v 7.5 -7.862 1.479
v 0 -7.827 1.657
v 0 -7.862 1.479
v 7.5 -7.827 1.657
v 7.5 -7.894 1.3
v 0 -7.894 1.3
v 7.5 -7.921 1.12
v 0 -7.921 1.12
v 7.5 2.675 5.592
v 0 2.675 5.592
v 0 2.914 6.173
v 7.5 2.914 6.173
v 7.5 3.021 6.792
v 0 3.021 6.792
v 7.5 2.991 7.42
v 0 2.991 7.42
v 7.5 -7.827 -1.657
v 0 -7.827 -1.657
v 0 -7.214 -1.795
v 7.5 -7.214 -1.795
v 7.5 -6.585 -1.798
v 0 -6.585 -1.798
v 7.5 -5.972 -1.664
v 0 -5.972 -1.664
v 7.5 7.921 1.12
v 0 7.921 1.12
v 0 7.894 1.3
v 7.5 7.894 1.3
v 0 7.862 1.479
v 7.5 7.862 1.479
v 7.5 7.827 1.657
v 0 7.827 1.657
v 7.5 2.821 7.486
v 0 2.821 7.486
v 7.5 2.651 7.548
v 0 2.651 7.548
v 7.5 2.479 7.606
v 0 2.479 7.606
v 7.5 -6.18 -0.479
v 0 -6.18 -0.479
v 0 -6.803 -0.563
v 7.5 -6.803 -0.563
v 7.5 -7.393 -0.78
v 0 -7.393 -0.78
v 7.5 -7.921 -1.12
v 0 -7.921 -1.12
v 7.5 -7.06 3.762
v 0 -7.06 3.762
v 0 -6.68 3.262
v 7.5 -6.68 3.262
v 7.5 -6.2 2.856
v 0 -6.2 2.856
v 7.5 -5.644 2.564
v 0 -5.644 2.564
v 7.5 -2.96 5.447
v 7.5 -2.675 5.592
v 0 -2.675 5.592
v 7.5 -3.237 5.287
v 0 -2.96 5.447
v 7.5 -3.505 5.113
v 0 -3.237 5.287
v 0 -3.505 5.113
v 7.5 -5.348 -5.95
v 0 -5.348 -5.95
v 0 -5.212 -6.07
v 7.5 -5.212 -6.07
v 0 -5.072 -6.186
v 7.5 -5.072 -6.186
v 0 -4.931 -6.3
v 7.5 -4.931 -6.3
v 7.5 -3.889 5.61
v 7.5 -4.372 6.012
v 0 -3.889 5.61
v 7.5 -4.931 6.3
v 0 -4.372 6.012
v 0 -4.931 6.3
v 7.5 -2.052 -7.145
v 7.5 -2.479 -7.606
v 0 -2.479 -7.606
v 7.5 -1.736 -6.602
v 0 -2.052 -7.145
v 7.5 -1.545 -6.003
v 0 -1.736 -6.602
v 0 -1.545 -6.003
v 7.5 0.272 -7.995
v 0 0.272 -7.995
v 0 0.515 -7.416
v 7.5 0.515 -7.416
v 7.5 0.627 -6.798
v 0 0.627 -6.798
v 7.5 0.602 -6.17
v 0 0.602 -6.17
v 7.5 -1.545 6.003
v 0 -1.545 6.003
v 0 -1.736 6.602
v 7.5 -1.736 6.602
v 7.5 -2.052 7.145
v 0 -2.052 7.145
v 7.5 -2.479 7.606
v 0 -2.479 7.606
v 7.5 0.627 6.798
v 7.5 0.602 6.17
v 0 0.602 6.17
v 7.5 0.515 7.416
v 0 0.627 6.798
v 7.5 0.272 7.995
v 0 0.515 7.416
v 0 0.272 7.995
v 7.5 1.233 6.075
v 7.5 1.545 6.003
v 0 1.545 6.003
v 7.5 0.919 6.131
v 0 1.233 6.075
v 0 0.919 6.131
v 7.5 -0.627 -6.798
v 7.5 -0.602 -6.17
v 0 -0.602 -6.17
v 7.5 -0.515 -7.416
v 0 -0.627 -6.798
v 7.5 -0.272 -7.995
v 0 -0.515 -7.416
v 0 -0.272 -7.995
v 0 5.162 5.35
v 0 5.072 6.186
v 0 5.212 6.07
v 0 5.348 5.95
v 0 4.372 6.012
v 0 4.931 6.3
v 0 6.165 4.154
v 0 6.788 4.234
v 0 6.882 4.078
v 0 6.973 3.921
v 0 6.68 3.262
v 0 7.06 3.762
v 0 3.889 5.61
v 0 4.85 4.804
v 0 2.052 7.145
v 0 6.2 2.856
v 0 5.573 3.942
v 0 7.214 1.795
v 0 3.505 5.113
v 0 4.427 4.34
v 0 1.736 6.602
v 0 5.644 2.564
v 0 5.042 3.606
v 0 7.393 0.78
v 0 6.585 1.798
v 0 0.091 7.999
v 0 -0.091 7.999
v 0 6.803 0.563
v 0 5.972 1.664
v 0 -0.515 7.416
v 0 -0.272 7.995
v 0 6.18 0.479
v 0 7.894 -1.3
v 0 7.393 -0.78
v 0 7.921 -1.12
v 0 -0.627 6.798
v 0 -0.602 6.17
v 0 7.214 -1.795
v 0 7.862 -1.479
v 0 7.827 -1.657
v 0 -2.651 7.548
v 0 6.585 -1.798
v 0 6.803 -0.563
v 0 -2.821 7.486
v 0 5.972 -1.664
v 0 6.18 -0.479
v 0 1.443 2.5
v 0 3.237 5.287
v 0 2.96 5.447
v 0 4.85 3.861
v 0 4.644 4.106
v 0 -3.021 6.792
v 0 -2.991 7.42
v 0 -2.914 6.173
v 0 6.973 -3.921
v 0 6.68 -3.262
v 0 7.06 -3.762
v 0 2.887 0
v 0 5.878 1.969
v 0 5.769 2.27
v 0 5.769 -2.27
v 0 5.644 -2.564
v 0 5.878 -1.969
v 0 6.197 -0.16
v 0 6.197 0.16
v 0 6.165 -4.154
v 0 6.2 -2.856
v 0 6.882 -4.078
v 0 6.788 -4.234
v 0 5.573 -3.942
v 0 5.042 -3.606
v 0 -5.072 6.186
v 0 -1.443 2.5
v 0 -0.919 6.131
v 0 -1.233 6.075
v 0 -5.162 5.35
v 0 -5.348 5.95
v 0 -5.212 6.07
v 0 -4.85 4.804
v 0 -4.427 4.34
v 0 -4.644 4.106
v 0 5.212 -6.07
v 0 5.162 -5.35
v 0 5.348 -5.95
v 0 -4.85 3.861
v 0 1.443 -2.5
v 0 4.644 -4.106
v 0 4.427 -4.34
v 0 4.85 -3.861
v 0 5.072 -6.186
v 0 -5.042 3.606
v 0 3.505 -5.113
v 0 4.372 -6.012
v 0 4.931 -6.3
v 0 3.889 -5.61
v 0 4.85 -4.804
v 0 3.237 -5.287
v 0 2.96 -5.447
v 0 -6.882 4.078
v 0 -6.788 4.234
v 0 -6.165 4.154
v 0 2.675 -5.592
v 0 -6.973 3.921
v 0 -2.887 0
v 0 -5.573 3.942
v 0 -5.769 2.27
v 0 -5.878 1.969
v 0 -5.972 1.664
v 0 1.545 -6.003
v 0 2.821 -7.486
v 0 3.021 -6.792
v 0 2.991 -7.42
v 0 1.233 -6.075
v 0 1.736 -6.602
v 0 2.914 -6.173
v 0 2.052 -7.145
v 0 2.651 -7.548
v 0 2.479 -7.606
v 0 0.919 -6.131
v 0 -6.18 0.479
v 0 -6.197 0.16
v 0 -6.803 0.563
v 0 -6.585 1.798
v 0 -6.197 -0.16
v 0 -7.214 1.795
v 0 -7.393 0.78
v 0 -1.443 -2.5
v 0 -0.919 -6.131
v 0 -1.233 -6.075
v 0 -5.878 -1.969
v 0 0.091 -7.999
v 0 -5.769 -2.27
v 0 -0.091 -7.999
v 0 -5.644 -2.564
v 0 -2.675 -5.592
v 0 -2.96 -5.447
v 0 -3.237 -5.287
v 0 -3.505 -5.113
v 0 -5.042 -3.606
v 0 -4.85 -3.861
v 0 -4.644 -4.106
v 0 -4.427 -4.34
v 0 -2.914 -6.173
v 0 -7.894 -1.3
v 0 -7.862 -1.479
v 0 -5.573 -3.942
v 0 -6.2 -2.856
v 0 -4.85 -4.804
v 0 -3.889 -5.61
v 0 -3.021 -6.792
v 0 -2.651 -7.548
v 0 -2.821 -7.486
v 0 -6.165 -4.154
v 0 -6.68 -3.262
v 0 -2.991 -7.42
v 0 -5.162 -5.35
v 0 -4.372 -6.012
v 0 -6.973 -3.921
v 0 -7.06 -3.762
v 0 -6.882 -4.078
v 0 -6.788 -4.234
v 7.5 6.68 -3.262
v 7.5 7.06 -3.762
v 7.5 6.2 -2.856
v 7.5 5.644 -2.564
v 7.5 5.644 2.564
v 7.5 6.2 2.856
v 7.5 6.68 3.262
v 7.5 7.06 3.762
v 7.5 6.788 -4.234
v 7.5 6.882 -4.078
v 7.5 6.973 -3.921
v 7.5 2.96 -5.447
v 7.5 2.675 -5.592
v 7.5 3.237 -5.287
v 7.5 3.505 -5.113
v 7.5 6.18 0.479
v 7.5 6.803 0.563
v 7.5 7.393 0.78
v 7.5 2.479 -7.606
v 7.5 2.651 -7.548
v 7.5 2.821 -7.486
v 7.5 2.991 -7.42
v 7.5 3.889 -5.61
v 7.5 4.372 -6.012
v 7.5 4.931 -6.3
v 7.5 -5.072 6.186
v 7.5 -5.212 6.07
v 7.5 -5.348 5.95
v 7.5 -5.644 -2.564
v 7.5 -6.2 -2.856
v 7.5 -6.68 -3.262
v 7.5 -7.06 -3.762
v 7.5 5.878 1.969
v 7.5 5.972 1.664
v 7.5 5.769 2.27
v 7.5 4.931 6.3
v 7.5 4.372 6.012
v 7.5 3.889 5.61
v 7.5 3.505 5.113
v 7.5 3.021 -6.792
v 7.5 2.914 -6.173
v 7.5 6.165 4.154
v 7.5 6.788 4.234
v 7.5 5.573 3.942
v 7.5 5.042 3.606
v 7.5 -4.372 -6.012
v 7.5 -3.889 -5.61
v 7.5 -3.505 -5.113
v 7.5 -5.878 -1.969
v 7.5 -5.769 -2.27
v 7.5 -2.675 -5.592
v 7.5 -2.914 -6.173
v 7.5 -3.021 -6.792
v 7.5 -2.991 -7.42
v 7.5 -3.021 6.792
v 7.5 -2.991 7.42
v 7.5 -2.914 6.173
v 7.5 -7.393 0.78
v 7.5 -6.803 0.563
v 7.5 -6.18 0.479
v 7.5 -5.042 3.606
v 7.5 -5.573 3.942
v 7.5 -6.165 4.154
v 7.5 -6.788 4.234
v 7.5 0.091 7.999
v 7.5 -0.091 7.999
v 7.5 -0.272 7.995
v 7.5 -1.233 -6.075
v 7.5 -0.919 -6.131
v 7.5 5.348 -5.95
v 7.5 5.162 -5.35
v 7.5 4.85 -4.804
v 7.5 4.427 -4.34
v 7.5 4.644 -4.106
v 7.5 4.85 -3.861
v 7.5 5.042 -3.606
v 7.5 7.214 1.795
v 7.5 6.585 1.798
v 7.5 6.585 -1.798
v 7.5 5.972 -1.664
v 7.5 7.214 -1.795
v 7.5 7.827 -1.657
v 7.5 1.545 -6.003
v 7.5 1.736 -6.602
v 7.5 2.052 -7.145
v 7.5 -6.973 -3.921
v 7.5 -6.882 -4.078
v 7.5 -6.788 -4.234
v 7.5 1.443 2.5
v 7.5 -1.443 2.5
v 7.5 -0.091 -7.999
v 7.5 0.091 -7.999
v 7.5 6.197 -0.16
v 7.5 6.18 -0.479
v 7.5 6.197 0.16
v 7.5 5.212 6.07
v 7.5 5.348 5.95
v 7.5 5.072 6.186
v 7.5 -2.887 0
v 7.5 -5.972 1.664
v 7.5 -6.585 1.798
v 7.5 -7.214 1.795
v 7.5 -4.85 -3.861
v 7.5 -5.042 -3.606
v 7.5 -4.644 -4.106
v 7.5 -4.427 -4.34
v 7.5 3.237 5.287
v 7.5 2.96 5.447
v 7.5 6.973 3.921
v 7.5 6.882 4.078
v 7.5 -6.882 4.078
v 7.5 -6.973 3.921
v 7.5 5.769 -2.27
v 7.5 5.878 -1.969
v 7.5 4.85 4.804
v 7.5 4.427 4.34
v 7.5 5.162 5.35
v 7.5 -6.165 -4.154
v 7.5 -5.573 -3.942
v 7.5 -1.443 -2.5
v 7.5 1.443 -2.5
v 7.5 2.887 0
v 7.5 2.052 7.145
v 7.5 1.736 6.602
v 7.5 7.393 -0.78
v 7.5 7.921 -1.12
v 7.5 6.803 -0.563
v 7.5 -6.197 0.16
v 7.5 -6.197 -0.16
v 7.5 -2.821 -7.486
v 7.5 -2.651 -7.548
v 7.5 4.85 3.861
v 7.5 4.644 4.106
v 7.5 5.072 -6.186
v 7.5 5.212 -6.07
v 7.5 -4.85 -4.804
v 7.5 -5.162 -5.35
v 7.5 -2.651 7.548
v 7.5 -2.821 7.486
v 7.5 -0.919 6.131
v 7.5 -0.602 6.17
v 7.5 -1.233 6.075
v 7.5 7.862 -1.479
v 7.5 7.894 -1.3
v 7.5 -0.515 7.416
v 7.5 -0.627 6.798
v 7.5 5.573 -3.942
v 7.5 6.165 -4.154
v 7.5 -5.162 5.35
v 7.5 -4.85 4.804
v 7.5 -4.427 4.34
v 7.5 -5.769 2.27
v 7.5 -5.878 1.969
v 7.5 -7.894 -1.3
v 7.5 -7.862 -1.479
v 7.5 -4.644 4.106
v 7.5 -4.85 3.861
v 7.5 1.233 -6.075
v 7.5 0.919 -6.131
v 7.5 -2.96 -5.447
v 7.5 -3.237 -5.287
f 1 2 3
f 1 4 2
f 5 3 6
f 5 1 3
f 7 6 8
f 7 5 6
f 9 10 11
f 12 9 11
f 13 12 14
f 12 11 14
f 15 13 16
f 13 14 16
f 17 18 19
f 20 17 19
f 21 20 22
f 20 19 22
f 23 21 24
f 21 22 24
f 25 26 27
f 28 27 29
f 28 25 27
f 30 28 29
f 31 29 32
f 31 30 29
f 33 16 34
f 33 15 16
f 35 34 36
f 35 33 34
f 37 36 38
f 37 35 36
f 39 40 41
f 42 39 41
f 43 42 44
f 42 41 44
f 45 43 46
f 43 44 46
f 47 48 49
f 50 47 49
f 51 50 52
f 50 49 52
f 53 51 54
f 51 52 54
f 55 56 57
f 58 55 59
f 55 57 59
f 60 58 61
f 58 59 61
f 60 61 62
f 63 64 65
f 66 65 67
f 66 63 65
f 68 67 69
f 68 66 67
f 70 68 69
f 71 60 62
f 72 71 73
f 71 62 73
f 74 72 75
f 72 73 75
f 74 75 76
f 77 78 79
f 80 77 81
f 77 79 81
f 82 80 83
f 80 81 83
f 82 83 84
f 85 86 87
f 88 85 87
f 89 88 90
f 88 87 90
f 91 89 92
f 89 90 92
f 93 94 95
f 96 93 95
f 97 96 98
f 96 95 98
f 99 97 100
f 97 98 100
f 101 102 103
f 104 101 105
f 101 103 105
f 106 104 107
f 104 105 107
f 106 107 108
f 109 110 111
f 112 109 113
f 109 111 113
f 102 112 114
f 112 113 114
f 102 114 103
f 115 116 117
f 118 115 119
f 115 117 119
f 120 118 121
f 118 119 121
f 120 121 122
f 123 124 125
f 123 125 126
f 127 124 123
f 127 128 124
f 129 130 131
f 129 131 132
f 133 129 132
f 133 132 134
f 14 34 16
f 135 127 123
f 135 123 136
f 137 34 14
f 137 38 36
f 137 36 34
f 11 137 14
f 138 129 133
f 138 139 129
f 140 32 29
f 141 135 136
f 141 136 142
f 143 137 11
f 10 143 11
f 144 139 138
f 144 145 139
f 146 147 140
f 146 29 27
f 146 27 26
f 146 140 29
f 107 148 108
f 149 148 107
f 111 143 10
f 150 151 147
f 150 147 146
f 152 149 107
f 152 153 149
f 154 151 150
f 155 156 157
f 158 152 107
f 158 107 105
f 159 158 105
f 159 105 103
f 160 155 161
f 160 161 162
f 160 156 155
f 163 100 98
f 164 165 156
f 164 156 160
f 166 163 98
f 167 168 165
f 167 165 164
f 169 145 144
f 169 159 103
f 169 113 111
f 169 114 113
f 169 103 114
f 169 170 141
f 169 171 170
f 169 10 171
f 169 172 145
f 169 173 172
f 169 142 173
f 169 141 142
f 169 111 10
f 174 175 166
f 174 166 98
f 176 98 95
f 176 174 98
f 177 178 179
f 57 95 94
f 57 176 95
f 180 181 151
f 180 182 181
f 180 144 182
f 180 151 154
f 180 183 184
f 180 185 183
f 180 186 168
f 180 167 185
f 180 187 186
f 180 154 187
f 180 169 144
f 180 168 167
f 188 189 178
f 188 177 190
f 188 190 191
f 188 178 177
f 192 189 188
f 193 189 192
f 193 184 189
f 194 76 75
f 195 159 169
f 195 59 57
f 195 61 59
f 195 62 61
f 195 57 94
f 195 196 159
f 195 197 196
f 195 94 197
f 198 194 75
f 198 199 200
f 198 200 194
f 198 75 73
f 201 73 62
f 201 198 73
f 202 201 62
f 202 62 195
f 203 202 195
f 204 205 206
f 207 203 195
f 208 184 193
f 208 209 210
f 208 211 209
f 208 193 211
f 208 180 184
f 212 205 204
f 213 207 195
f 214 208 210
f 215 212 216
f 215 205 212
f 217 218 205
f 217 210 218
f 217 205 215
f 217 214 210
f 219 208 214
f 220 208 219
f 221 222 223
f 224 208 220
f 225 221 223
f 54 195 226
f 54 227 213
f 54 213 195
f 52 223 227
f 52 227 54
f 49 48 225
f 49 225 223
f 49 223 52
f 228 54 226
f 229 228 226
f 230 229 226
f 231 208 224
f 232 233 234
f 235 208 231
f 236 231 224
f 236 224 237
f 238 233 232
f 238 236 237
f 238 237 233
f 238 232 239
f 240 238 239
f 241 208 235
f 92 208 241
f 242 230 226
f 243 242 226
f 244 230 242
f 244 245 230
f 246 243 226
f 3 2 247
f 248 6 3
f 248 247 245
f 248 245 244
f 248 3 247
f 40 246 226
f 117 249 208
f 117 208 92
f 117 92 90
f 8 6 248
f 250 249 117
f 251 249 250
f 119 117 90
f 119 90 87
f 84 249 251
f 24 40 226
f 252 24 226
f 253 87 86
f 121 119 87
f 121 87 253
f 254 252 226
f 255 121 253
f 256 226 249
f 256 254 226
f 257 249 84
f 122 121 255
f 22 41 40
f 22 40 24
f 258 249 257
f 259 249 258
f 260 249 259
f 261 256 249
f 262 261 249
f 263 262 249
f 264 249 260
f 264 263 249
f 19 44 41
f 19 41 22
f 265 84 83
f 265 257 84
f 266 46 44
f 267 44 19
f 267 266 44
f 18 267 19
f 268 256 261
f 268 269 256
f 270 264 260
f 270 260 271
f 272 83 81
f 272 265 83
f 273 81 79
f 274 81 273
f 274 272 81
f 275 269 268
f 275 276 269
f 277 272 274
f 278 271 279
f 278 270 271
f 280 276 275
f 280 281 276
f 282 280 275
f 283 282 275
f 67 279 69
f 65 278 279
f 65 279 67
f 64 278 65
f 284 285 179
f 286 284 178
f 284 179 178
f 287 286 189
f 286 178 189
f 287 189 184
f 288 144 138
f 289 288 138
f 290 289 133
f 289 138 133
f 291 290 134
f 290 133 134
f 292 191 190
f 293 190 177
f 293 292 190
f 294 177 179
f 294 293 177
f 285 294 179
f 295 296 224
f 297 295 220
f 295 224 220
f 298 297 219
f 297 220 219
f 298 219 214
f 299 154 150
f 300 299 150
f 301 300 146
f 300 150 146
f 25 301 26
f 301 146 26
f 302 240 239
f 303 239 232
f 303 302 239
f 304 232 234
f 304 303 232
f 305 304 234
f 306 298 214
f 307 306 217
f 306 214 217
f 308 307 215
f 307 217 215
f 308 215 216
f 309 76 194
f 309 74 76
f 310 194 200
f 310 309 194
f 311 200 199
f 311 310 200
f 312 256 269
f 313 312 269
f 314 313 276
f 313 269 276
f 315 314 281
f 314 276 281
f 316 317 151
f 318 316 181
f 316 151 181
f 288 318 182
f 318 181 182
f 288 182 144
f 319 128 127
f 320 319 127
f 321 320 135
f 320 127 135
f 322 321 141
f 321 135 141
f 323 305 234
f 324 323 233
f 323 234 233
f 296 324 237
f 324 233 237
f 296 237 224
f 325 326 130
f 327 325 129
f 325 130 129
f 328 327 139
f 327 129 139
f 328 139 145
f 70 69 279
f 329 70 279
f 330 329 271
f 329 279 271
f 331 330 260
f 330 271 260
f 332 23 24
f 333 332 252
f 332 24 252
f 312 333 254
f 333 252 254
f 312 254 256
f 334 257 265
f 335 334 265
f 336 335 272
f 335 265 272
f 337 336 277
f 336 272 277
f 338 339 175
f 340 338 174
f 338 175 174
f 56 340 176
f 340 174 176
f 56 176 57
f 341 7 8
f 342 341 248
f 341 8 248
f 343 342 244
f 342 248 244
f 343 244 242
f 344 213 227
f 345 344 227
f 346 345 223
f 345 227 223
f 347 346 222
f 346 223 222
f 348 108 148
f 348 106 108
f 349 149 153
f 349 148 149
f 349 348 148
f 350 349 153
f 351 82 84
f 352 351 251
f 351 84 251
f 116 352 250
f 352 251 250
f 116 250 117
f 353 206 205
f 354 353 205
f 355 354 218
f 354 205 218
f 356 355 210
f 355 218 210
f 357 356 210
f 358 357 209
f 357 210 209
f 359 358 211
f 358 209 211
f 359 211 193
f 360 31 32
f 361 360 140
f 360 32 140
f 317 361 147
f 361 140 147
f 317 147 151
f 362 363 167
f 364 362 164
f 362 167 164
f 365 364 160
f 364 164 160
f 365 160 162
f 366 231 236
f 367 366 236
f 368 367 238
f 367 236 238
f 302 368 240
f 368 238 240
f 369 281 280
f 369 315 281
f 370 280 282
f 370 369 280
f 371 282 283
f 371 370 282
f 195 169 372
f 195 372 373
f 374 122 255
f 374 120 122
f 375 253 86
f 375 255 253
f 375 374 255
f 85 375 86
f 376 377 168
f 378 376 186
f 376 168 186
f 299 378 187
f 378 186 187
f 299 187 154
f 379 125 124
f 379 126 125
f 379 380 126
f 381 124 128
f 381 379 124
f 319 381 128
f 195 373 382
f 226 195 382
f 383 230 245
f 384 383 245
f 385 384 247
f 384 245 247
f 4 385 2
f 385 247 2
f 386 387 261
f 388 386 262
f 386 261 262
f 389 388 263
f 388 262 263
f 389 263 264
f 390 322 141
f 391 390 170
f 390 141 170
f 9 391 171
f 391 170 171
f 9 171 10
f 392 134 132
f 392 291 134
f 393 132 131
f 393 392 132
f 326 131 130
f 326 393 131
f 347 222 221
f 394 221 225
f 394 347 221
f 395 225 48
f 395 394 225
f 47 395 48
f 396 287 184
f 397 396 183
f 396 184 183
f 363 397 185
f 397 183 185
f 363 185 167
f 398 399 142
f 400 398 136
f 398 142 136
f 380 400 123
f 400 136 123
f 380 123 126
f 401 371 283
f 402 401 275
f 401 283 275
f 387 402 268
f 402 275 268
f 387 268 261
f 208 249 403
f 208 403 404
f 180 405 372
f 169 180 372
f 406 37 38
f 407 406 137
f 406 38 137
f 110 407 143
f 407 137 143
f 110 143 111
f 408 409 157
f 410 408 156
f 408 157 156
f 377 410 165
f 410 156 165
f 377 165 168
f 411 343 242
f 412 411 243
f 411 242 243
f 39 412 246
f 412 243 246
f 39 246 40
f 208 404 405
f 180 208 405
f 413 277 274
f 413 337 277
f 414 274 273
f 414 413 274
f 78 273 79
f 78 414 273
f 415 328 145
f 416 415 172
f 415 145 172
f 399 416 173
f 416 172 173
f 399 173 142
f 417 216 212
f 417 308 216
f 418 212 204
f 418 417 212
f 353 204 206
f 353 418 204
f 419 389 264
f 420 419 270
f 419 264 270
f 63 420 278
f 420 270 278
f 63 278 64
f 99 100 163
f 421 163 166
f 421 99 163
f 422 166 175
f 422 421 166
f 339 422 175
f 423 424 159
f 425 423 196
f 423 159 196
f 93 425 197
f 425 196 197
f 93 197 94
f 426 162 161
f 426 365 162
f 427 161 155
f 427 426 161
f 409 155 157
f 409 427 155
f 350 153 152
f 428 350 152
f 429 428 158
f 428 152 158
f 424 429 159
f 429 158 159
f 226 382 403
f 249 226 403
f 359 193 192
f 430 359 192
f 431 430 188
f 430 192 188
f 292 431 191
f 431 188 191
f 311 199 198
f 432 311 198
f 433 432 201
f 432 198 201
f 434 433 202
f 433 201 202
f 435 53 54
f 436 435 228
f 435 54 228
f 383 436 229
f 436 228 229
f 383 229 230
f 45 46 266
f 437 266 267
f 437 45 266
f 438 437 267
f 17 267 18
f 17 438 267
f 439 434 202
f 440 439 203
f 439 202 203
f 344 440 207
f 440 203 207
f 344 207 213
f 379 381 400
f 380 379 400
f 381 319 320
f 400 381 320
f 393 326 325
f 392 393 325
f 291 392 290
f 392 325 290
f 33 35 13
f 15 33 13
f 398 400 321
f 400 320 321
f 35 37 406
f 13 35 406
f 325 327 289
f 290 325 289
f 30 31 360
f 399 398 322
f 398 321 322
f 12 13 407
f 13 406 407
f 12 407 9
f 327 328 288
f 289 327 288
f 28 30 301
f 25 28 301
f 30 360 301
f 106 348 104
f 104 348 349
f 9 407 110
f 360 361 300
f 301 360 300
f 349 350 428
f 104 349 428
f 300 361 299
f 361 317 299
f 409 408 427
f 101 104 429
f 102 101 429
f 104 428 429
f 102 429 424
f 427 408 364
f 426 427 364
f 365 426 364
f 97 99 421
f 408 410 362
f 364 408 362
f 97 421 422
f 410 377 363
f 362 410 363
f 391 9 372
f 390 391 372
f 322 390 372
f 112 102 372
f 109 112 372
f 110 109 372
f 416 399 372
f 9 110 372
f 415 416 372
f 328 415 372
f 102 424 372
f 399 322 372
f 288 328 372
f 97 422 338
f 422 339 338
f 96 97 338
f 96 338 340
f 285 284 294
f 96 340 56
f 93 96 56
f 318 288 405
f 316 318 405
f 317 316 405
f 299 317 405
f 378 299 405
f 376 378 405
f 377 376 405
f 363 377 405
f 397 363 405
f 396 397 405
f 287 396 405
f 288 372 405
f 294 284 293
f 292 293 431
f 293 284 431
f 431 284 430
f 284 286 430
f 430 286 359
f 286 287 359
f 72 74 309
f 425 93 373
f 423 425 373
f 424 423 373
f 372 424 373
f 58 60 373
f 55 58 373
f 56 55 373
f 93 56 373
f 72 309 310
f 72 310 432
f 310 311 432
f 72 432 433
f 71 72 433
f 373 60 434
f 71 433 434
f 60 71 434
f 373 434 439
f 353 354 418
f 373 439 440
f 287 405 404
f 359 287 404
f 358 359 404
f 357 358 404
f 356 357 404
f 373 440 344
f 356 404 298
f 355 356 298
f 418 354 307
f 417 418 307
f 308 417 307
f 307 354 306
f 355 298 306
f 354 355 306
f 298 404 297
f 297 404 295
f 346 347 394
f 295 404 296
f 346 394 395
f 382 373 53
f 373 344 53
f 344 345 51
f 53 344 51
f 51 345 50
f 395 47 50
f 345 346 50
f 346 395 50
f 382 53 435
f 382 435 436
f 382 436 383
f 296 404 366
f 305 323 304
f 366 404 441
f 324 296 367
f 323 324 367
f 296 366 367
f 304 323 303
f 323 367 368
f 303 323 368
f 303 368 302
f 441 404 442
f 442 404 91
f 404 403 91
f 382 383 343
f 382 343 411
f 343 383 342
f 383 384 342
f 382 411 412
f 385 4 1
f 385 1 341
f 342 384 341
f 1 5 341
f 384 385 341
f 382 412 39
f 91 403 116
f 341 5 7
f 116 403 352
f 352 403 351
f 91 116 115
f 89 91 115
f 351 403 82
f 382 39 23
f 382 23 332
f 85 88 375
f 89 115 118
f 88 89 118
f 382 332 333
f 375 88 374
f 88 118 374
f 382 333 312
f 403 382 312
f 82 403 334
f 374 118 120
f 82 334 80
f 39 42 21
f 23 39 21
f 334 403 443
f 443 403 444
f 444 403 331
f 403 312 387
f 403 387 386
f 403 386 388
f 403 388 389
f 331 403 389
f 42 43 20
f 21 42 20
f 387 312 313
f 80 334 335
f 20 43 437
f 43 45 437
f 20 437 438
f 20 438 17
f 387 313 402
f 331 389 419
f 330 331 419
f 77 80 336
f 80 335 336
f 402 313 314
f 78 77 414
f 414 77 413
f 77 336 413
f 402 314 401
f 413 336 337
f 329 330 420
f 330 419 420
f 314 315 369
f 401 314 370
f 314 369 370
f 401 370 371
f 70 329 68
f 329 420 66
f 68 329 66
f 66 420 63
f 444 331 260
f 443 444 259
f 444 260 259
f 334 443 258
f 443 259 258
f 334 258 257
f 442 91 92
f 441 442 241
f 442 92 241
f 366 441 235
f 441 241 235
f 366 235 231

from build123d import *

# Parameters (mm, degrees)
BASPROSKE_W              = 7.5
BASPROSKE_H              = 8
TOOTHCUT_DEPTH           = 14.57387196
TEETHCUTS_COUNT          = 18
TEETHCUTS_ANGLE          = 340
BORSKE_R                 = 2.5
BORE_DEPTH               = 50.0000508
TAGLIO_ESTRUSIONE1_DEPTH = 10


with BuildPart() as part:
    # BasProSke → Base-Revolve (revolve)
    with BuildSketch(Plane(origin=(0, 0, 0), x_dir=(1, 0, 0), z_dir=(0, 1, 0)), mode=Mode.PRIVATE) as base_revolve_sk:
        with Locations((3.75, 4)):
            Rectangle(BASPROSKE_W, BASPROSKE_H)
    revolve(base_revolve_sk.sketch.rotate(Axis((-10, 0, 0), (1, 0, 0)), 180), axis=Axis((-10, 0, 0), (1, 0, 0)))

    # TooCutSke → ToothCut (cut, through all)
    with BuildSketch(Plane(origin=(0, 0, 0), x_dir=(0, 0, -1), z_dir=(1, 0, 0))):
        with BuildLine():
            ThreePointArc((0.478981505, 6.180467435), (0, 6.199), (-0.478981505, 6.180467435))
            ThreePointArc((-0.478981505, 6.180467435), (-0.660732846, 7.117783932), (-1.138936203, 7.944172045))
            ThreePointArc((-1.138936203, 7.944172045), (0, 8.0254), (1.138936203, 7.944172045))
            ThreePointArc((1.138936203, 7.944172045), (0.660732846, 7.117783932), (0.478981505, 6.180467435))
        make_face()
    toothcut = extrude(amount=TOOTHCUT_DEPTH, mode=Mode.SUBTRACT)

    # TeethCuts: ToothCut ×18 about axis
    teethcuts_axis = Axis((-10, 0, 0), (1, 0, 0))
    for i in range(1, TEETHCUTS_COUNT):
        add(toothcut.rotate(teethcuts_axis, i * TEETHCUTS_ANGLE / (TEETHCUTS_COUNT - 1)), mode=Mode.SUBTRACT)

    # BorSke → Bore (cut, symmetric)
    with BuildSketch(Plane(origin=(0, 0, 0), x_dir=(0, 0, -1), z_dir=(1, 0, 0))):
        with Locations(Location((0, 0, 0), (0, 0, 180))):
            Circle(BORSKE_R)
    extrude(amount=BORE_DEPTH, both=True, mode=Mode.SUBTRACT)

    # Schizzo2 → Taglio-Estrusione1 (cut)
    with BuildSketch(Plane(origin=(7.5, 0, 0), x_dir=(0, 0, -1), z_dir=(1, 0, 0))):
        Polygon((0, 2.886751346), (-2.5, 1.443375673), (-2.5, -1.443375673), (0, -2.886751346), (2.5, -1.443375673), (2.5, 1.443375673), align=None)
    extrude(amount=-TAGLIO_ESTRUSIONE1_DEPTH, mode=Mode.SUBTRACT)


solid = part.part
